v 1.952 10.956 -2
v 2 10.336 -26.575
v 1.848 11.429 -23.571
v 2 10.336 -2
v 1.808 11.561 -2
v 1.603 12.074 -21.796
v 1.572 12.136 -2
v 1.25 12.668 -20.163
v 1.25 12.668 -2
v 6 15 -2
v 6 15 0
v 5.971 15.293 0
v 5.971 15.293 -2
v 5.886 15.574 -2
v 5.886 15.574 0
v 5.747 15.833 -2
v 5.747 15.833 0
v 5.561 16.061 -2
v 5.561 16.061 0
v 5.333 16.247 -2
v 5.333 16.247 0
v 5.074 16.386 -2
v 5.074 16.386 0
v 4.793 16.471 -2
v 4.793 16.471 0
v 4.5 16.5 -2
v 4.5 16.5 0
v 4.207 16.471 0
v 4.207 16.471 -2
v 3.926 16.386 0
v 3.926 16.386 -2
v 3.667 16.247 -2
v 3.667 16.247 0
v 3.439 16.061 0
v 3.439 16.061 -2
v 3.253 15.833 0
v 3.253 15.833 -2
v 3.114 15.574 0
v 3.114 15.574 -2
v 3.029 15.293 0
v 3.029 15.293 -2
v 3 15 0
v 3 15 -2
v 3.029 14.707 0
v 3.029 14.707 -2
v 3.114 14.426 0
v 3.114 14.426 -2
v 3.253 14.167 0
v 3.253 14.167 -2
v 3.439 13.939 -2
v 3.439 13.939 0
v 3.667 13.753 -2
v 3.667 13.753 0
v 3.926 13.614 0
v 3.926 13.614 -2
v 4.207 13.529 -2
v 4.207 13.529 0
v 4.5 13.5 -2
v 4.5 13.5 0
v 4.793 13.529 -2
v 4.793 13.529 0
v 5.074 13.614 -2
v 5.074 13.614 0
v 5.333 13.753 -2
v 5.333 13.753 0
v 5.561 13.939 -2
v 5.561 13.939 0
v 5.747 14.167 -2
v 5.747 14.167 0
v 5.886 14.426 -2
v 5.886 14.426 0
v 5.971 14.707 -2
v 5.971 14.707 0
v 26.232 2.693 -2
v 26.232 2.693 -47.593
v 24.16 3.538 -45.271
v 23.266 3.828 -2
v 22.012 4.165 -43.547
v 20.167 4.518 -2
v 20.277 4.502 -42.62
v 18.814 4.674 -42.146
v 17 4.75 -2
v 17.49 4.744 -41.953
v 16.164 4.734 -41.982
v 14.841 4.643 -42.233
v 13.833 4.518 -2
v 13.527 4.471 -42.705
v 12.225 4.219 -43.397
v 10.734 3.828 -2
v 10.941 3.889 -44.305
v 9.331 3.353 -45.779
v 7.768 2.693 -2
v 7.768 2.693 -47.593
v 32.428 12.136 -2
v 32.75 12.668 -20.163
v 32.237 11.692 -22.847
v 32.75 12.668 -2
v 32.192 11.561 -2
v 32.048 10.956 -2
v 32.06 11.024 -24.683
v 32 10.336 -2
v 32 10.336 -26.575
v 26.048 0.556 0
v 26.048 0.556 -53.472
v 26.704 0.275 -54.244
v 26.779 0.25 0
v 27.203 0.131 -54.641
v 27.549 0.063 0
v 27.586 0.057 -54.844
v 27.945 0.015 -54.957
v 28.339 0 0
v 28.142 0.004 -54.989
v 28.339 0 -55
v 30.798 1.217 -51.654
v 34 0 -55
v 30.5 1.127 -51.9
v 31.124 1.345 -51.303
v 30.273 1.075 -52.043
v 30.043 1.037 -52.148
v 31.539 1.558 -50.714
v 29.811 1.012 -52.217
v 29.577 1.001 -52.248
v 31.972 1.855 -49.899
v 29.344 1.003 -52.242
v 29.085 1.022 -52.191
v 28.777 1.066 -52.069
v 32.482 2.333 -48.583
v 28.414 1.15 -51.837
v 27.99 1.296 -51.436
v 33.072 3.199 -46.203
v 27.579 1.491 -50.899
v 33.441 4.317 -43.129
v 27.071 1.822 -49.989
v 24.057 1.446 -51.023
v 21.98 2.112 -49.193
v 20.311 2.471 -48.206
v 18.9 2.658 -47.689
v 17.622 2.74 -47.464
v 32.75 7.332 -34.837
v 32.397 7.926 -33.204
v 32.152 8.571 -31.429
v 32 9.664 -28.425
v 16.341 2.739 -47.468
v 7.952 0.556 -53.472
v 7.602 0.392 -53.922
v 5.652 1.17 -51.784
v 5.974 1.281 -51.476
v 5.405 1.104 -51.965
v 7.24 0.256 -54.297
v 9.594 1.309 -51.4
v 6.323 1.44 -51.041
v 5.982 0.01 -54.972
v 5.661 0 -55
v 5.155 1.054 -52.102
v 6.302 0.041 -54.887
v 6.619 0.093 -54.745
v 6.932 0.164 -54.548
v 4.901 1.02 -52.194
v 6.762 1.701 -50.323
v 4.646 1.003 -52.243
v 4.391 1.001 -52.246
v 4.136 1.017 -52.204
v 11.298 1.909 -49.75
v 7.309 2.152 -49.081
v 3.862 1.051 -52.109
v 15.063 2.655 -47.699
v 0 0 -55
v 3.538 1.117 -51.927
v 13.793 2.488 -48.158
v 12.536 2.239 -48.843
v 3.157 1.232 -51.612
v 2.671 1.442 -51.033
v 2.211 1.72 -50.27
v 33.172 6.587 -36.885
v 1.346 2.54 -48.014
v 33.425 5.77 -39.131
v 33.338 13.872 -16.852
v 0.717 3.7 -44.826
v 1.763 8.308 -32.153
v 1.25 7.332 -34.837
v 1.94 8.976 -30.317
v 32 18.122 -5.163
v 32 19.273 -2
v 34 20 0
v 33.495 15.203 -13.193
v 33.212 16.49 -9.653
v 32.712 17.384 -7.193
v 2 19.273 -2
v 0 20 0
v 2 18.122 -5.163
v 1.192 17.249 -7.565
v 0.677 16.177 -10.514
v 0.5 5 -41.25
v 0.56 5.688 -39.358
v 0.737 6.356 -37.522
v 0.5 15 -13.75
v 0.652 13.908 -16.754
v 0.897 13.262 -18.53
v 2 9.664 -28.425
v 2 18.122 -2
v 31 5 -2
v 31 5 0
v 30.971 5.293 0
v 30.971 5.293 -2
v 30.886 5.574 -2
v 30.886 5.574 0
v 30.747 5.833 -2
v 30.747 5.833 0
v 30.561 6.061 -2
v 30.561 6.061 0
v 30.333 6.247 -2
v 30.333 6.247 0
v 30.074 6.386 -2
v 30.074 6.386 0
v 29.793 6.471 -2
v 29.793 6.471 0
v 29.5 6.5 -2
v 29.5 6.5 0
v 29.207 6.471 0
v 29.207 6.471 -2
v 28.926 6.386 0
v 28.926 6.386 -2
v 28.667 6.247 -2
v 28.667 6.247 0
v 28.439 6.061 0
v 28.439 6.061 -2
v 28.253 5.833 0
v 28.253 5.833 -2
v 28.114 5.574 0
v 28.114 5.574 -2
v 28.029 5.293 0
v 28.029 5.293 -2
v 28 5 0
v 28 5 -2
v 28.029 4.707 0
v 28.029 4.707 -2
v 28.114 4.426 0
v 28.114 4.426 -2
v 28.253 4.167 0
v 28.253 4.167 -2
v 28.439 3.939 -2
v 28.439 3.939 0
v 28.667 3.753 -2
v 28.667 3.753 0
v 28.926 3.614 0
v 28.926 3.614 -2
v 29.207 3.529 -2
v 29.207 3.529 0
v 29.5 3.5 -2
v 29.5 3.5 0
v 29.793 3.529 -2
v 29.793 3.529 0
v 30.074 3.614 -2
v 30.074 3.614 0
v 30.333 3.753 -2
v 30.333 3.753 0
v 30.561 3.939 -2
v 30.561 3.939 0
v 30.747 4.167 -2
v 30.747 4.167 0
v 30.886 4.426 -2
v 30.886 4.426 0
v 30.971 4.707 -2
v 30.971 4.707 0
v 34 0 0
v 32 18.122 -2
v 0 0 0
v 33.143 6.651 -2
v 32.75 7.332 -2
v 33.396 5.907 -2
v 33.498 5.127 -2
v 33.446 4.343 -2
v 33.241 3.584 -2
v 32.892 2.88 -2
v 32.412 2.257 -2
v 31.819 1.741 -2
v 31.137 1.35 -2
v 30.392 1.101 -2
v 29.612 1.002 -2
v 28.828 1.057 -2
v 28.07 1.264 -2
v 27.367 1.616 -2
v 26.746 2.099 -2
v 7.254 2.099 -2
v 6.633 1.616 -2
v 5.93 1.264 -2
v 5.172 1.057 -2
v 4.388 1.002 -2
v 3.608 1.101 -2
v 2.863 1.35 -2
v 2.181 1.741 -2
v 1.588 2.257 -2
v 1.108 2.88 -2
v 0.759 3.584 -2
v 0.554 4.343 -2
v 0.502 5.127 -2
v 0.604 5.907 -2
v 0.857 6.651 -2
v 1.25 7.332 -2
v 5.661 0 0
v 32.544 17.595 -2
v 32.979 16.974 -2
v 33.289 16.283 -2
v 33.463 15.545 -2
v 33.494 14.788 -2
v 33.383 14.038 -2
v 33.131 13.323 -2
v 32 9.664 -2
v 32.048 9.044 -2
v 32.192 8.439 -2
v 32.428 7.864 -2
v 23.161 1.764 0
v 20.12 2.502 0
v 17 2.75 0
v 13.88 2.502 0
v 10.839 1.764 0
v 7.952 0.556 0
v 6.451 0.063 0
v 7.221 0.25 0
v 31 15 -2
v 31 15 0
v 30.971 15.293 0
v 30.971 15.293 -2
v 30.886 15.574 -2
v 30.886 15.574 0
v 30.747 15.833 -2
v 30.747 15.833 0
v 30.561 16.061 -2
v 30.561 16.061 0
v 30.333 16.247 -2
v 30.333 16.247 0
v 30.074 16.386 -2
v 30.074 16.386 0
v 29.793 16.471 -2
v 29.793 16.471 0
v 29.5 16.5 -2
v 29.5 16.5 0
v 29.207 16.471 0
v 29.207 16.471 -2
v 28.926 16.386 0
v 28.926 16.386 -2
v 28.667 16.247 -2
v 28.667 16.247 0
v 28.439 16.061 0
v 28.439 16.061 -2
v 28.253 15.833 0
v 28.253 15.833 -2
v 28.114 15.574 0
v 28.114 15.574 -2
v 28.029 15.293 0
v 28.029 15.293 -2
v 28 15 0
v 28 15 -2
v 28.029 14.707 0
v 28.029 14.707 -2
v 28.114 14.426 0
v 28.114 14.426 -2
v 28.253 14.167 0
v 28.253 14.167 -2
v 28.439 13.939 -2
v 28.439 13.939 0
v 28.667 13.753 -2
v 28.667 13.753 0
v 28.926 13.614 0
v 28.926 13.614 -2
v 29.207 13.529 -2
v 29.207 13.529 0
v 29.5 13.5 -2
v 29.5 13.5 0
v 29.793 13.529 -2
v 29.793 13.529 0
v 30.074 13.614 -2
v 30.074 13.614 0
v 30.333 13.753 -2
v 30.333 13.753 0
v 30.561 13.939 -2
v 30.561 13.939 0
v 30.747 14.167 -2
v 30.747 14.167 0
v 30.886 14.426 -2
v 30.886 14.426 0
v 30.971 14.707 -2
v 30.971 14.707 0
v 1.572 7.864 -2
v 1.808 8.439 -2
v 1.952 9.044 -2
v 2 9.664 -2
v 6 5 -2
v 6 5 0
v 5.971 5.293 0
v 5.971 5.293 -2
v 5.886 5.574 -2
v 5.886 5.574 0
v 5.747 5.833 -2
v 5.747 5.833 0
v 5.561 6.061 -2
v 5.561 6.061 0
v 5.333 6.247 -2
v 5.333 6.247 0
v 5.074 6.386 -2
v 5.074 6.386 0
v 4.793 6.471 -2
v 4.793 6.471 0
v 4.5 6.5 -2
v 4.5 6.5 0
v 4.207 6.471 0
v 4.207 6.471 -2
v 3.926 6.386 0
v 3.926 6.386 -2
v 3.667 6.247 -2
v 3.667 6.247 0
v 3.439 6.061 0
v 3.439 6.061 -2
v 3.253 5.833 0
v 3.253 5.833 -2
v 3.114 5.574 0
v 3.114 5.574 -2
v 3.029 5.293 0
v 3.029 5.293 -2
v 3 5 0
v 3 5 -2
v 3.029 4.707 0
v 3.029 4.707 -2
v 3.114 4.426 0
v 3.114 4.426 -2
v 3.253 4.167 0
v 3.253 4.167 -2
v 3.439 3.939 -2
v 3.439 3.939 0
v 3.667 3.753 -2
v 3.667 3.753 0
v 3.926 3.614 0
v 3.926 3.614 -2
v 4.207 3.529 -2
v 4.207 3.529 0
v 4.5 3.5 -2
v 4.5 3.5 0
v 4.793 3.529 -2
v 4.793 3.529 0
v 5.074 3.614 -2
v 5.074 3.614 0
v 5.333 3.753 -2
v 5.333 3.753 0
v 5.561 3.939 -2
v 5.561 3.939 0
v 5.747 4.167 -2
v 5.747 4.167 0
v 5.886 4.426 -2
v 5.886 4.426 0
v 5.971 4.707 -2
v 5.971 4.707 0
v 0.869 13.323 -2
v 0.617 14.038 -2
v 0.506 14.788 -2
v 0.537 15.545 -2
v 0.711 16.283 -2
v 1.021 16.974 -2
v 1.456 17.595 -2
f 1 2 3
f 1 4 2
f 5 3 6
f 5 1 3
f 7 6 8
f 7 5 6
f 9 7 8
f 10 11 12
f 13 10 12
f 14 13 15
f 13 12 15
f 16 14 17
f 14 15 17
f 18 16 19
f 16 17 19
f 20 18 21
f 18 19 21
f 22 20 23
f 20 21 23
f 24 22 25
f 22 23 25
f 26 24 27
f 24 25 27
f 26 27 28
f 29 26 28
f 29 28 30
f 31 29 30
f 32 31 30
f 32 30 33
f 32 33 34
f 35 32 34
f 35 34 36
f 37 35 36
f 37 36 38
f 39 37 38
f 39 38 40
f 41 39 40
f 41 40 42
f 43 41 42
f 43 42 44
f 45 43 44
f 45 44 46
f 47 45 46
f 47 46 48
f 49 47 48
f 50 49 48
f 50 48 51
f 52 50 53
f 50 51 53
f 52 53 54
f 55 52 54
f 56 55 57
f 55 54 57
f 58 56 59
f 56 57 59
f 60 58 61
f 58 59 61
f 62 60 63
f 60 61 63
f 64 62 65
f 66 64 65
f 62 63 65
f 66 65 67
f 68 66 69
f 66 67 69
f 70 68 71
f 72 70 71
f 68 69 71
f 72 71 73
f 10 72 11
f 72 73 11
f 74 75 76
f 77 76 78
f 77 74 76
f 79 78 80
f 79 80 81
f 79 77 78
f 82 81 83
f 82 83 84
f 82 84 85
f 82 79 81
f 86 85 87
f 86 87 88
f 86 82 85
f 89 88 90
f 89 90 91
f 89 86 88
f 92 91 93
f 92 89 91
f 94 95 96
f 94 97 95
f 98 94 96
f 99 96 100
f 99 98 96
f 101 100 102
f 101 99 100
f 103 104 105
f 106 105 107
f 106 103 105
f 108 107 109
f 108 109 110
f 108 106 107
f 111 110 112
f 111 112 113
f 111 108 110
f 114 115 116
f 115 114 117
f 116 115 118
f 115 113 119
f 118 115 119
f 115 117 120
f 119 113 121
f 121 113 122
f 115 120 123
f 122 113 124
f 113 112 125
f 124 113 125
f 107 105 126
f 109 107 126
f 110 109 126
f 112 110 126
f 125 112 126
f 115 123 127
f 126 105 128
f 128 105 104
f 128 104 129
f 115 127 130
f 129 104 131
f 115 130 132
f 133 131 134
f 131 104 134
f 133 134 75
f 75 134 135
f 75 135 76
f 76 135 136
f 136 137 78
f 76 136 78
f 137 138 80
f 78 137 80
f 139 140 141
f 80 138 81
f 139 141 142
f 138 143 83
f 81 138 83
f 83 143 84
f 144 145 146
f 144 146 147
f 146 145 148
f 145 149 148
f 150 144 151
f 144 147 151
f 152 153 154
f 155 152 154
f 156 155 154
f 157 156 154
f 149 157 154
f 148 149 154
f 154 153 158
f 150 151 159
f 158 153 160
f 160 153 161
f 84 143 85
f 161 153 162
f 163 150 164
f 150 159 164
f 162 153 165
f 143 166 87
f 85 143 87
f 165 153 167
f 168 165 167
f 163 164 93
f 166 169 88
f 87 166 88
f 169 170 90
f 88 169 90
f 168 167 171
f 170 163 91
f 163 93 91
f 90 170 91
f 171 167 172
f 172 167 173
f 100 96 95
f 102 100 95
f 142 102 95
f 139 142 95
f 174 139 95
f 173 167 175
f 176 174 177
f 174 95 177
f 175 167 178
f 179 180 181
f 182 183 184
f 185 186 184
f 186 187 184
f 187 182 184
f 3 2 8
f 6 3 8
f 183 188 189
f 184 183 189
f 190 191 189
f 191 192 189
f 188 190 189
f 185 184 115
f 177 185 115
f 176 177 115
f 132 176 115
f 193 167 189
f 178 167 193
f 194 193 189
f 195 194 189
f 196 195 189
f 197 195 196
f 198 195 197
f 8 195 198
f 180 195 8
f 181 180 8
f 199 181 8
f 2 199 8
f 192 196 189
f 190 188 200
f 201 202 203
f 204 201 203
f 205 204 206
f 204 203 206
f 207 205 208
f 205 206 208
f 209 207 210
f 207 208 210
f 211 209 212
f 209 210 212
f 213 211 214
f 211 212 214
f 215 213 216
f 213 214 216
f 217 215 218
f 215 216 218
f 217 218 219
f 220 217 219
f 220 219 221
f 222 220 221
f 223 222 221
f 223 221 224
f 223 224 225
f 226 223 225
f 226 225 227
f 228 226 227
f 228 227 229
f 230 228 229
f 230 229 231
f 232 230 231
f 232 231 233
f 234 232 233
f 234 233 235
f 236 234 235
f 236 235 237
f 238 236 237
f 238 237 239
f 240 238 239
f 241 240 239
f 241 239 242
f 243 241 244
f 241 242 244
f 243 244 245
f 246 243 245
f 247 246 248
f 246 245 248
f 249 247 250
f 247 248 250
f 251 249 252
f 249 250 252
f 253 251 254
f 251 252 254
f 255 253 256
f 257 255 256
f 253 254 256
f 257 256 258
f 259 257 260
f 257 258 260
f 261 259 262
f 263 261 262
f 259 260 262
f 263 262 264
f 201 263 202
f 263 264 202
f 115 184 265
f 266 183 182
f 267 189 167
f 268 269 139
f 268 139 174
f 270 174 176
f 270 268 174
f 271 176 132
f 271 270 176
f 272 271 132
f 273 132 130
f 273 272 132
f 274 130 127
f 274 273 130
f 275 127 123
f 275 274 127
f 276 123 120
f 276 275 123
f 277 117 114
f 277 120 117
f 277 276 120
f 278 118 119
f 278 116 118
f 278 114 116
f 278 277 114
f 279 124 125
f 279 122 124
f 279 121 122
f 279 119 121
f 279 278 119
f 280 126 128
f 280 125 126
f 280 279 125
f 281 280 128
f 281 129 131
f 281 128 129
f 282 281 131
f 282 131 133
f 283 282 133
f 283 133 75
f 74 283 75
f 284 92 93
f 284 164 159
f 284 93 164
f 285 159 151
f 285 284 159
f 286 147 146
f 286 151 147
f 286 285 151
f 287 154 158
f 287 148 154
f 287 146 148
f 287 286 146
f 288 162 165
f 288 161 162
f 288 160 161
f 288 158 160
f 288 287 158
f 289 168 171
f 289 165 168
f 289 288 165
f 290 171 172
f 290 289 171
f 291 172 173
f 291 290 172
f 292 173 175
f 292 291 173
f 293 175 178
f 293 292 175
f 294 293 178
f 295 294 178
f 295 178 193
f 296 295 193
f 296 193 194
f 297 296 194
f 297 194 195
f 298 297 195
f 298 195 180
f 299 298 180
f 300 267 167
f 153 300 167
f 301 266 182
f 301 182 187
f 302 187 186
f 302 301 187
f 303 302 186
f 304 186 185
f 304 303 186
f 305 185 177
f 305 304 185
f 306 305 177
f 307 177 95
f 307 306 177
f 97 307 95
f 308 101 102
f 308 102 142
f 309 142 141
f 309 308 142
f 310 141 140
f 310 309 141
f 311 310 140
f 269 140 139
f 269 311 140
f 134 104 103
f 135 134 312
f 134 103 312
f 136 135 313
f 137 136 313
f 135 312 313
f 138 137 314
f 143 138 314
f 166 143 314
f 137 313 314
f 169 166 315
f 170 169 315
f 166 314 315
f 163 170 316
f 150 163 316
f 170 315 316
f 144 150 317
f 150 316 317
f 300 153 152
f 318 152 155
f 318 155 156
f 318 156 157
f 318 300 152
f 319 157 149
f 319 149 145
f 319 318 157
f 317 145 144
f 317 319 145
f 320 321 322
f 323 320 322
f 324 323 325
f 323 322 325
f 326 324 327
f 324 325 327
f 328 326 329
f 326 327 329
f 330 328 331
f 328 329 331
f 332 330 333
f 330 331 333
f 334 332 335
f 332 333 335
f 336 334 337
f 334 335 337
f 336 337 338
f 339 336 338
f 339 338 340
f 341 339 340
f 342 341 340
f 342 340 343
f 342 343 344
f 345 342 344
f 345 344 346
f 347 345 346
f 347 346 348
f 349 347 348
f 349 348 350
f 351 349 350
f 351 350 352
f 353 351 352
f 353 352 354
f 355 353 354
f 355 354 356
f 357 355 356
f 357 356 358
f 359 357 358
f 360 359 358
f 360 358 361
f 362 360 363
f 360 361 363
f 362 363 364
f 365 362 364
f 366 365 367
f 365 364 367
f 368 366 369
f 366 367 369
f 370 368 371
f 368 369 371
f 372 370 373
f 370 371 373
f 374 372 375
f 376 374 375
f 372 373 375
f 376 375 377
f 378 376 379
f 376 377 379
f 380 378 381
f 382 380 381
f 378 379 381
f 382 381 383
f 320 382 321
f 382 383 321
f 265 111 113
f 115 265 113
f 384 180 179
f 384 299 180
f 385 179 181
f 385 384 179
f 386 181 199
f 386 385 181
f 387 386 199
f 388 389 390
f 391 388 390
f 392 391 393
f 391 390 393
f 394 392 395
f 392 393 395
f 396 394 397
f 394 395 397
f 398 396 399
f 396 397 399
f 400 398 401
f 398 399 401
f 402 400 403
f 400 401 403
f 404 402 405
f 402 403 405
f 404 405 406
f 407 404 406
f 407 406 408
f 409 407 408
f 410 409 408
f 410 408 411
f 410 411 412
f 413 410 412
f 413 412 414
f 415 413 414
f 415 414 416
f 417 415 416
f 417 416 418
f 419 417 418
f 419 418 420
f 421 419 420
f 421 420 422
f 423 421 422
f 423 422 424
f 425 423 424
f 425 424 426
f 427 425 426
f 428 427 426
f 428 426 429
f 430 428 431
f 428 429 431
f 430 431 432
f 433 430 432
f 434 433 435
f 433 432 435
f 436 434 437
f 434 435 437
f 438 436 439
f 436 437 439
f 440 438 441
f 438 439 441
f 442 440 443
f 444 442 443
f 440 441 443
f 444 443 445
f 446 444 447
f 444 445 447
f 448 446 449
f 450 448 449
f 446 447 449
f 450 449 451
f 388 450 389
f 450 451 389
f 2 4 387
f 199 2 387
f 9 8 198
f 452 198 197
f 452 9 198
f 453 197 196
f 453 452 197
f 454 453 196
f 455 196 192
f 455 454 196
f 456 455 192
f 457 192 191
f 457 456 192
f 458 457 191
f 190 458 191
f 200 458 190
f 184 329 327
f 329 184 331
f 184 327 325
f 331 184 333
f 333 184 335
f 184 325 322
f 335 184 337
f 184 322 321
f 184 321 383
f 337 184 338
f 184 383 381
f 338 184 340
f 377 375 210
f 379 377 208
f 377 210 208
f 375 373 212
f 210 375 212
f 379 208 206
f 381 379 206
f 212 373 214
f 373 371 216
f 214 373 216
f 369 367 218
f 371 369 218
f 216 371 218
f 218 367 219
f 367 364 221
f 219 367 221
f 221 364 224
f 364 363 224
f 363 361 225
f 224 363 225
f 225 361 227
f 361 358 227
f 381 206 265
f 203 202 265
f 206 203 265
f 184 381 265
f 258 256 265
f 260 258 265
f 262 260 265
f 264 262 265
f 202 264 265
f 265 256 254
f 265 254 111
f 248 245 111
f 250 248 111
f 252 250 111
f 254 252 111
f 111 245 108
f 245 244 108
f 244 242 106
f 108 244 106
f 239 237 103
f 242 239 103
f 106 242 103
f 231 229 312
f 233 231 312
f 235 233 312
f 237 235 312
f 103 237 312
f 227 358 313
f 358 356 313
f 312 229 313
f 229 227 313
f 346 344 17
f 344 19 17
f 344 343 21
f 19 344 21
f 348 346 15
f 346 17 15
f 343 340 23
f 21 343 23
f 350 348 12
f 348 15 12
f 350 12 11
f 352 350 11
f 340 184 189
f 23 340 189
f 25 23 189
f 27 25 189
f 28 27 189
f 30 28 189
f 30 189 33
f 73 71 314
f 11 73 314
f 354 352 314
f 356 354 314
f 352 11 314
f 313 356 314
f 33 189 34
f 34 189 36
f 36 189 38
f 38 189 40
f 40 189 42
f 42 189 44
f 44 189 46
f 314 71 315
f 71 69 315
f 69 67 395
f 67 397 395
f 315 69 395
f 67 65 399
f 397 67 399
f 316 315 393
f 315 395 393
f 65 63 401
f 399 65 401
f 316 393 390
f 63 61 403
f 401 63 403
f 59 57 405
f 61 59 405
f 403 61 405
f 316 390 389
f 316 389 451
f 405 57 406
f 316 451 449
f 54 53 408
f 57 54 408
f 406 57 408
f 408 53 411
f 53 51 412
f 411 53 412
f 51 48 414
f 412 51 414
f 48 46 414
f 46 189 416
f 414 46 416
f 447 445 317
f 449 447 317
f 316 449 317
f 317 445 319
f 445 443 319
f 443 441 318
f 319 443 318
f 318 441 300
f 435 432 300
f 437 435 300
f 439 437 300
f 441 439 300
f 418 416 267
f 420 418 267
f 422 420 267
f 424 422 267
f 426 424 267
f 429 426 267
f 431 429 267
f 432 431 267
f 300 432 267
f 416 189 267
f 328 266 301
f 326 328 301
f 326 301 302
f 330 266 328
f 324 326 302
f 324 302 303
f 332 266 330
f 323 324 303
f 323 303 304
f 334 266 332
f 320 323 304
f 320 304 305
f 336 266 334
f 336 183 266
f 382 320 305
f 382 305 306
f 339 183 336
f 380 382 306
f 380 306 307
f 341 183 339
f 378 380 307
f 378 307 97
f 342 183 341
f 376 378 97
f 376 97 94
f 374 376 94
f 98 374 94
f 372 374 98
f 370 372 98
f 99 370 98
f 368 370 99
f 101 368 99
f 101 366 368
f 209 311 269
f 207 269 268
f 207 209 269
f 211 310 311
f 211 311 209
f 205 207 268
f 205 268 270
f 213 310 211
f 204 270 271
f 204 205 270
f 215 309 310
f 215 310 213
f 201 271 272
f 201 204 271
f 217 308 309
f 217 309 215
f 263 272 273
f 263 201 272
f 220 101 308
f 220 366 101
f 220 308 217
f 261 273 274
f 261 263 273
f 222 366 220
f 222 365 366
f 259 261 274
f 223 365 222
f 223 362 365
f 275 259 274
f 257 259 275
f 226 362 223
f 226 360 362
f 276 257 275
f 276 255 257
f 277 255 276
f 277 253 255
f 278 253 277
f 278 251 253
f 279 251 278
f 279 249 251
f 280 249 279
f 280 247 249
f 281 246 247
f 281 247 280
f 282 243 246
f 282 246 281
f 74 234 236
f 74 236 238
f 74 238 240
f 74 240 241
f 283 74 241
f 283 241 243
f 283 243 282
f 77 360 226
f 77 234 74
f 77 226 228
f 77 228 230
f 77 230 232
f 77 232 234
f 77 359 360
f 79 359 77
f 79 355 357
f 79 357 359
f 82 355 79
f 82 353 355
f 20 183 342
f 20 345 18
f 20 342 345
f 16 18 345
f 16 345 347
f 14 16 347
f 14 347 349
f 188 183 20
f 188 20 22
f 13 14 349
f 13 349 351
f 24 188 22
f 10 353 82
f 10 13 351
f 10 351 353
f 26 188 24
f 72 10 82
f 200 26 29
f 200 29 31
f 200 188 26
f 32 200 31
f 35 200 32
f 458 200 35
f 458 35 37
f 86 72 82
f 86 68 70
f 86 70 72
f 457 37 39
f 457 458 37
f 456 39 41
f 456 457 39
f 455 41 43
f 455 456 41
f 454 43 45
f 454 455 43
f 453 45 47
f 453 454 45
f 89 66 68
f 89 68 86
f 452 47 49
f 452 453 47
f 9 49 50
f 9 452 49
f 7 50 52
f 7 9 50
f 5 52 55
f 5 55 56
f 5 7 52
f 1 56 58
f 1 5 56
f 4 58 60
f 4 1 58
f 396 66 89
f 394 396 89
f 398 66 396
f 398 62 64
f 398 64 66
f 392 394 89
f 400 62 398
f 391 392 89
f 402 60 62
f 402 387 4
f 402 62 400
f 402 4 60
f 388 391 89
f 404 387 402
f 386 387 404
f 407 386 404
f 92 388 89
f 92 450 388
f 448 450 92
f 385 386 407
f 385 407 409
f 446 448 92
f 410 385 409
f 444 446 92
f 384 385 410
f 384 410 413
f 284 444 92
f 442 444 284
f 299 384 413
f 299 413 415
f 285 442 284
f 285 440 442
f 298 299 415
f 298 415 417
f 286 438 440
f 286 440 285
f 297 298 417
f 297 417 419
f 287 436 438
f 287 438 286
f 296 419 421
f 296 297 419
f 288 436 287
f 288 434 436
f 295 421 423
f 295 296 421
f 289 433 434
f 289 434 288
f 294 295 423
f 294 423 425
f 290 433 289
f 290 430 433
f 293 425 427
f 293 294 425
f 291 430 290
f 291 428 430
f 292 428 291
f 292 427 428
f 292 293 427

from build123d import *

# Parameters (mm, degrees)
SALIENTE_EXTRUIR3_DEPTH = 34
CROQUIS6_R              = 19.75
CORTAR_EXTRUIR2_DEPTH   = 68.683085036
VACIADO3_T              = -2
CROQUIS5_R              = 1.5
CORTAR_EXTRUIR3_DEPTH   = 10
REDONDEO1_R             = 5
REDONDEO3_R             = 5
CROQUIS10_R             = 4
CORTAR_EXTRUIR7_DEPTH   = 67.068146637
REDONDEO4_R             = 4


with BuildPart() as part:
    # Croquis4 → Saliente-Extruir3 (new body)
    with BuildSketch(Plane(origin=(0, 0, 0), x_dir=(0, 0, -1), z_dir=(1, 0, 0))):
        Polygon((0, 0), (55, 0), (0, 20), align=None)
    extrude(amount=SALIENTE_EXTRUIR3_DEPTH)

    # Croquis6 → Cortar-Extruir2 (cut, through all)
    with BuildSketch(Plane.XY):
        with Locations((17, -17)):
            Circle(CROQUIS6_R)
    extrude(amount=-CORTAR_EXTRUIR2_DEPTH, mode=Mode.SUBTRACT)

    # Vaciado3
    vaciado3_openings = [part.faces().sort_by_distance(p)[0] for p in [
        (17, 10.517691614, -26.076348062),
    ]]
    offset(amount=VACIADO3_T, openings=vaciado3_openings, kind=Kind.INTERSECTION)

    # Croquis5 → Cortar-Extruir3 (cut)
    with BuildSketch(Plane.XY):
        with Locations((4.5, 15)):
            Circle(CROQUIS5_R)
        with Locations((29.5, 15)):
            Circle(CROQUIS5_R)
        with Locations((29.5, 5)):
            Circle(CROQUIS5_R)
        with Locations((4.5, 5)):
            Circle(CROQUIS5_R)
    extrude(amount=-CORTAR_EXTRUIR3_DEPTH, mode=Mode.SUBTRACT)

    # Redondeo1
    redondeo1_edges = [part.edges().sort_by_distance(p)[0] for p in [
        (27.052984631, 0, -27.5),
        (6.947015369, 0, -27.5),
    ]]
    fillet(redondeo1_edges, radius=REDONDEO1_R)

    # Redondeo3
    redondeo3_edges = [part.edges().sort_by_distance(p)[0] for p in [
        (6.41404232, 2, -25.750000004),
        (27.58595768, 2, -25.75),
    ]]
    fillet(redondeo3_edges, radius=REDONDEO3_R)

    # Croquis10 → Cortar-Extruir7 (cut, through all)
    with BuildSketch(Plane(origin=(0, 0, -2), x_dir=(-1, 0, 0), z_dir=(0, 0, -1))):
        with Locations((-29.5, 15)):
            Circle(CROQUIS10_R)
        with Locations((-4.5, 15)):
            Circle(CROQUIS10_R)
        with Locations((-4.5, 5)):
            Circle(CROQUIS10_R)
        with Locations((-29.5, 5)):
            Circle(CROQUIS10_R)
    extrude(amount=CORTAR_EXTRUIR7_DEPTH, mode=Mode.SUBTRACT)

    # Redondeo4
    redondeo4_edges = [part.edges().sort_by_distance(p)[0] for p in [
        (2, 8.122498999, -17.331563876),
        (2, 11.877501001, -12.168436124),
        (32, 8.122498999, -17.331563876),
        (32, 11.877501001, -12.168436124),
    ]]
    fillet(redondeo4_edges, radius=REDONDEO4_R)


solid = part.part
